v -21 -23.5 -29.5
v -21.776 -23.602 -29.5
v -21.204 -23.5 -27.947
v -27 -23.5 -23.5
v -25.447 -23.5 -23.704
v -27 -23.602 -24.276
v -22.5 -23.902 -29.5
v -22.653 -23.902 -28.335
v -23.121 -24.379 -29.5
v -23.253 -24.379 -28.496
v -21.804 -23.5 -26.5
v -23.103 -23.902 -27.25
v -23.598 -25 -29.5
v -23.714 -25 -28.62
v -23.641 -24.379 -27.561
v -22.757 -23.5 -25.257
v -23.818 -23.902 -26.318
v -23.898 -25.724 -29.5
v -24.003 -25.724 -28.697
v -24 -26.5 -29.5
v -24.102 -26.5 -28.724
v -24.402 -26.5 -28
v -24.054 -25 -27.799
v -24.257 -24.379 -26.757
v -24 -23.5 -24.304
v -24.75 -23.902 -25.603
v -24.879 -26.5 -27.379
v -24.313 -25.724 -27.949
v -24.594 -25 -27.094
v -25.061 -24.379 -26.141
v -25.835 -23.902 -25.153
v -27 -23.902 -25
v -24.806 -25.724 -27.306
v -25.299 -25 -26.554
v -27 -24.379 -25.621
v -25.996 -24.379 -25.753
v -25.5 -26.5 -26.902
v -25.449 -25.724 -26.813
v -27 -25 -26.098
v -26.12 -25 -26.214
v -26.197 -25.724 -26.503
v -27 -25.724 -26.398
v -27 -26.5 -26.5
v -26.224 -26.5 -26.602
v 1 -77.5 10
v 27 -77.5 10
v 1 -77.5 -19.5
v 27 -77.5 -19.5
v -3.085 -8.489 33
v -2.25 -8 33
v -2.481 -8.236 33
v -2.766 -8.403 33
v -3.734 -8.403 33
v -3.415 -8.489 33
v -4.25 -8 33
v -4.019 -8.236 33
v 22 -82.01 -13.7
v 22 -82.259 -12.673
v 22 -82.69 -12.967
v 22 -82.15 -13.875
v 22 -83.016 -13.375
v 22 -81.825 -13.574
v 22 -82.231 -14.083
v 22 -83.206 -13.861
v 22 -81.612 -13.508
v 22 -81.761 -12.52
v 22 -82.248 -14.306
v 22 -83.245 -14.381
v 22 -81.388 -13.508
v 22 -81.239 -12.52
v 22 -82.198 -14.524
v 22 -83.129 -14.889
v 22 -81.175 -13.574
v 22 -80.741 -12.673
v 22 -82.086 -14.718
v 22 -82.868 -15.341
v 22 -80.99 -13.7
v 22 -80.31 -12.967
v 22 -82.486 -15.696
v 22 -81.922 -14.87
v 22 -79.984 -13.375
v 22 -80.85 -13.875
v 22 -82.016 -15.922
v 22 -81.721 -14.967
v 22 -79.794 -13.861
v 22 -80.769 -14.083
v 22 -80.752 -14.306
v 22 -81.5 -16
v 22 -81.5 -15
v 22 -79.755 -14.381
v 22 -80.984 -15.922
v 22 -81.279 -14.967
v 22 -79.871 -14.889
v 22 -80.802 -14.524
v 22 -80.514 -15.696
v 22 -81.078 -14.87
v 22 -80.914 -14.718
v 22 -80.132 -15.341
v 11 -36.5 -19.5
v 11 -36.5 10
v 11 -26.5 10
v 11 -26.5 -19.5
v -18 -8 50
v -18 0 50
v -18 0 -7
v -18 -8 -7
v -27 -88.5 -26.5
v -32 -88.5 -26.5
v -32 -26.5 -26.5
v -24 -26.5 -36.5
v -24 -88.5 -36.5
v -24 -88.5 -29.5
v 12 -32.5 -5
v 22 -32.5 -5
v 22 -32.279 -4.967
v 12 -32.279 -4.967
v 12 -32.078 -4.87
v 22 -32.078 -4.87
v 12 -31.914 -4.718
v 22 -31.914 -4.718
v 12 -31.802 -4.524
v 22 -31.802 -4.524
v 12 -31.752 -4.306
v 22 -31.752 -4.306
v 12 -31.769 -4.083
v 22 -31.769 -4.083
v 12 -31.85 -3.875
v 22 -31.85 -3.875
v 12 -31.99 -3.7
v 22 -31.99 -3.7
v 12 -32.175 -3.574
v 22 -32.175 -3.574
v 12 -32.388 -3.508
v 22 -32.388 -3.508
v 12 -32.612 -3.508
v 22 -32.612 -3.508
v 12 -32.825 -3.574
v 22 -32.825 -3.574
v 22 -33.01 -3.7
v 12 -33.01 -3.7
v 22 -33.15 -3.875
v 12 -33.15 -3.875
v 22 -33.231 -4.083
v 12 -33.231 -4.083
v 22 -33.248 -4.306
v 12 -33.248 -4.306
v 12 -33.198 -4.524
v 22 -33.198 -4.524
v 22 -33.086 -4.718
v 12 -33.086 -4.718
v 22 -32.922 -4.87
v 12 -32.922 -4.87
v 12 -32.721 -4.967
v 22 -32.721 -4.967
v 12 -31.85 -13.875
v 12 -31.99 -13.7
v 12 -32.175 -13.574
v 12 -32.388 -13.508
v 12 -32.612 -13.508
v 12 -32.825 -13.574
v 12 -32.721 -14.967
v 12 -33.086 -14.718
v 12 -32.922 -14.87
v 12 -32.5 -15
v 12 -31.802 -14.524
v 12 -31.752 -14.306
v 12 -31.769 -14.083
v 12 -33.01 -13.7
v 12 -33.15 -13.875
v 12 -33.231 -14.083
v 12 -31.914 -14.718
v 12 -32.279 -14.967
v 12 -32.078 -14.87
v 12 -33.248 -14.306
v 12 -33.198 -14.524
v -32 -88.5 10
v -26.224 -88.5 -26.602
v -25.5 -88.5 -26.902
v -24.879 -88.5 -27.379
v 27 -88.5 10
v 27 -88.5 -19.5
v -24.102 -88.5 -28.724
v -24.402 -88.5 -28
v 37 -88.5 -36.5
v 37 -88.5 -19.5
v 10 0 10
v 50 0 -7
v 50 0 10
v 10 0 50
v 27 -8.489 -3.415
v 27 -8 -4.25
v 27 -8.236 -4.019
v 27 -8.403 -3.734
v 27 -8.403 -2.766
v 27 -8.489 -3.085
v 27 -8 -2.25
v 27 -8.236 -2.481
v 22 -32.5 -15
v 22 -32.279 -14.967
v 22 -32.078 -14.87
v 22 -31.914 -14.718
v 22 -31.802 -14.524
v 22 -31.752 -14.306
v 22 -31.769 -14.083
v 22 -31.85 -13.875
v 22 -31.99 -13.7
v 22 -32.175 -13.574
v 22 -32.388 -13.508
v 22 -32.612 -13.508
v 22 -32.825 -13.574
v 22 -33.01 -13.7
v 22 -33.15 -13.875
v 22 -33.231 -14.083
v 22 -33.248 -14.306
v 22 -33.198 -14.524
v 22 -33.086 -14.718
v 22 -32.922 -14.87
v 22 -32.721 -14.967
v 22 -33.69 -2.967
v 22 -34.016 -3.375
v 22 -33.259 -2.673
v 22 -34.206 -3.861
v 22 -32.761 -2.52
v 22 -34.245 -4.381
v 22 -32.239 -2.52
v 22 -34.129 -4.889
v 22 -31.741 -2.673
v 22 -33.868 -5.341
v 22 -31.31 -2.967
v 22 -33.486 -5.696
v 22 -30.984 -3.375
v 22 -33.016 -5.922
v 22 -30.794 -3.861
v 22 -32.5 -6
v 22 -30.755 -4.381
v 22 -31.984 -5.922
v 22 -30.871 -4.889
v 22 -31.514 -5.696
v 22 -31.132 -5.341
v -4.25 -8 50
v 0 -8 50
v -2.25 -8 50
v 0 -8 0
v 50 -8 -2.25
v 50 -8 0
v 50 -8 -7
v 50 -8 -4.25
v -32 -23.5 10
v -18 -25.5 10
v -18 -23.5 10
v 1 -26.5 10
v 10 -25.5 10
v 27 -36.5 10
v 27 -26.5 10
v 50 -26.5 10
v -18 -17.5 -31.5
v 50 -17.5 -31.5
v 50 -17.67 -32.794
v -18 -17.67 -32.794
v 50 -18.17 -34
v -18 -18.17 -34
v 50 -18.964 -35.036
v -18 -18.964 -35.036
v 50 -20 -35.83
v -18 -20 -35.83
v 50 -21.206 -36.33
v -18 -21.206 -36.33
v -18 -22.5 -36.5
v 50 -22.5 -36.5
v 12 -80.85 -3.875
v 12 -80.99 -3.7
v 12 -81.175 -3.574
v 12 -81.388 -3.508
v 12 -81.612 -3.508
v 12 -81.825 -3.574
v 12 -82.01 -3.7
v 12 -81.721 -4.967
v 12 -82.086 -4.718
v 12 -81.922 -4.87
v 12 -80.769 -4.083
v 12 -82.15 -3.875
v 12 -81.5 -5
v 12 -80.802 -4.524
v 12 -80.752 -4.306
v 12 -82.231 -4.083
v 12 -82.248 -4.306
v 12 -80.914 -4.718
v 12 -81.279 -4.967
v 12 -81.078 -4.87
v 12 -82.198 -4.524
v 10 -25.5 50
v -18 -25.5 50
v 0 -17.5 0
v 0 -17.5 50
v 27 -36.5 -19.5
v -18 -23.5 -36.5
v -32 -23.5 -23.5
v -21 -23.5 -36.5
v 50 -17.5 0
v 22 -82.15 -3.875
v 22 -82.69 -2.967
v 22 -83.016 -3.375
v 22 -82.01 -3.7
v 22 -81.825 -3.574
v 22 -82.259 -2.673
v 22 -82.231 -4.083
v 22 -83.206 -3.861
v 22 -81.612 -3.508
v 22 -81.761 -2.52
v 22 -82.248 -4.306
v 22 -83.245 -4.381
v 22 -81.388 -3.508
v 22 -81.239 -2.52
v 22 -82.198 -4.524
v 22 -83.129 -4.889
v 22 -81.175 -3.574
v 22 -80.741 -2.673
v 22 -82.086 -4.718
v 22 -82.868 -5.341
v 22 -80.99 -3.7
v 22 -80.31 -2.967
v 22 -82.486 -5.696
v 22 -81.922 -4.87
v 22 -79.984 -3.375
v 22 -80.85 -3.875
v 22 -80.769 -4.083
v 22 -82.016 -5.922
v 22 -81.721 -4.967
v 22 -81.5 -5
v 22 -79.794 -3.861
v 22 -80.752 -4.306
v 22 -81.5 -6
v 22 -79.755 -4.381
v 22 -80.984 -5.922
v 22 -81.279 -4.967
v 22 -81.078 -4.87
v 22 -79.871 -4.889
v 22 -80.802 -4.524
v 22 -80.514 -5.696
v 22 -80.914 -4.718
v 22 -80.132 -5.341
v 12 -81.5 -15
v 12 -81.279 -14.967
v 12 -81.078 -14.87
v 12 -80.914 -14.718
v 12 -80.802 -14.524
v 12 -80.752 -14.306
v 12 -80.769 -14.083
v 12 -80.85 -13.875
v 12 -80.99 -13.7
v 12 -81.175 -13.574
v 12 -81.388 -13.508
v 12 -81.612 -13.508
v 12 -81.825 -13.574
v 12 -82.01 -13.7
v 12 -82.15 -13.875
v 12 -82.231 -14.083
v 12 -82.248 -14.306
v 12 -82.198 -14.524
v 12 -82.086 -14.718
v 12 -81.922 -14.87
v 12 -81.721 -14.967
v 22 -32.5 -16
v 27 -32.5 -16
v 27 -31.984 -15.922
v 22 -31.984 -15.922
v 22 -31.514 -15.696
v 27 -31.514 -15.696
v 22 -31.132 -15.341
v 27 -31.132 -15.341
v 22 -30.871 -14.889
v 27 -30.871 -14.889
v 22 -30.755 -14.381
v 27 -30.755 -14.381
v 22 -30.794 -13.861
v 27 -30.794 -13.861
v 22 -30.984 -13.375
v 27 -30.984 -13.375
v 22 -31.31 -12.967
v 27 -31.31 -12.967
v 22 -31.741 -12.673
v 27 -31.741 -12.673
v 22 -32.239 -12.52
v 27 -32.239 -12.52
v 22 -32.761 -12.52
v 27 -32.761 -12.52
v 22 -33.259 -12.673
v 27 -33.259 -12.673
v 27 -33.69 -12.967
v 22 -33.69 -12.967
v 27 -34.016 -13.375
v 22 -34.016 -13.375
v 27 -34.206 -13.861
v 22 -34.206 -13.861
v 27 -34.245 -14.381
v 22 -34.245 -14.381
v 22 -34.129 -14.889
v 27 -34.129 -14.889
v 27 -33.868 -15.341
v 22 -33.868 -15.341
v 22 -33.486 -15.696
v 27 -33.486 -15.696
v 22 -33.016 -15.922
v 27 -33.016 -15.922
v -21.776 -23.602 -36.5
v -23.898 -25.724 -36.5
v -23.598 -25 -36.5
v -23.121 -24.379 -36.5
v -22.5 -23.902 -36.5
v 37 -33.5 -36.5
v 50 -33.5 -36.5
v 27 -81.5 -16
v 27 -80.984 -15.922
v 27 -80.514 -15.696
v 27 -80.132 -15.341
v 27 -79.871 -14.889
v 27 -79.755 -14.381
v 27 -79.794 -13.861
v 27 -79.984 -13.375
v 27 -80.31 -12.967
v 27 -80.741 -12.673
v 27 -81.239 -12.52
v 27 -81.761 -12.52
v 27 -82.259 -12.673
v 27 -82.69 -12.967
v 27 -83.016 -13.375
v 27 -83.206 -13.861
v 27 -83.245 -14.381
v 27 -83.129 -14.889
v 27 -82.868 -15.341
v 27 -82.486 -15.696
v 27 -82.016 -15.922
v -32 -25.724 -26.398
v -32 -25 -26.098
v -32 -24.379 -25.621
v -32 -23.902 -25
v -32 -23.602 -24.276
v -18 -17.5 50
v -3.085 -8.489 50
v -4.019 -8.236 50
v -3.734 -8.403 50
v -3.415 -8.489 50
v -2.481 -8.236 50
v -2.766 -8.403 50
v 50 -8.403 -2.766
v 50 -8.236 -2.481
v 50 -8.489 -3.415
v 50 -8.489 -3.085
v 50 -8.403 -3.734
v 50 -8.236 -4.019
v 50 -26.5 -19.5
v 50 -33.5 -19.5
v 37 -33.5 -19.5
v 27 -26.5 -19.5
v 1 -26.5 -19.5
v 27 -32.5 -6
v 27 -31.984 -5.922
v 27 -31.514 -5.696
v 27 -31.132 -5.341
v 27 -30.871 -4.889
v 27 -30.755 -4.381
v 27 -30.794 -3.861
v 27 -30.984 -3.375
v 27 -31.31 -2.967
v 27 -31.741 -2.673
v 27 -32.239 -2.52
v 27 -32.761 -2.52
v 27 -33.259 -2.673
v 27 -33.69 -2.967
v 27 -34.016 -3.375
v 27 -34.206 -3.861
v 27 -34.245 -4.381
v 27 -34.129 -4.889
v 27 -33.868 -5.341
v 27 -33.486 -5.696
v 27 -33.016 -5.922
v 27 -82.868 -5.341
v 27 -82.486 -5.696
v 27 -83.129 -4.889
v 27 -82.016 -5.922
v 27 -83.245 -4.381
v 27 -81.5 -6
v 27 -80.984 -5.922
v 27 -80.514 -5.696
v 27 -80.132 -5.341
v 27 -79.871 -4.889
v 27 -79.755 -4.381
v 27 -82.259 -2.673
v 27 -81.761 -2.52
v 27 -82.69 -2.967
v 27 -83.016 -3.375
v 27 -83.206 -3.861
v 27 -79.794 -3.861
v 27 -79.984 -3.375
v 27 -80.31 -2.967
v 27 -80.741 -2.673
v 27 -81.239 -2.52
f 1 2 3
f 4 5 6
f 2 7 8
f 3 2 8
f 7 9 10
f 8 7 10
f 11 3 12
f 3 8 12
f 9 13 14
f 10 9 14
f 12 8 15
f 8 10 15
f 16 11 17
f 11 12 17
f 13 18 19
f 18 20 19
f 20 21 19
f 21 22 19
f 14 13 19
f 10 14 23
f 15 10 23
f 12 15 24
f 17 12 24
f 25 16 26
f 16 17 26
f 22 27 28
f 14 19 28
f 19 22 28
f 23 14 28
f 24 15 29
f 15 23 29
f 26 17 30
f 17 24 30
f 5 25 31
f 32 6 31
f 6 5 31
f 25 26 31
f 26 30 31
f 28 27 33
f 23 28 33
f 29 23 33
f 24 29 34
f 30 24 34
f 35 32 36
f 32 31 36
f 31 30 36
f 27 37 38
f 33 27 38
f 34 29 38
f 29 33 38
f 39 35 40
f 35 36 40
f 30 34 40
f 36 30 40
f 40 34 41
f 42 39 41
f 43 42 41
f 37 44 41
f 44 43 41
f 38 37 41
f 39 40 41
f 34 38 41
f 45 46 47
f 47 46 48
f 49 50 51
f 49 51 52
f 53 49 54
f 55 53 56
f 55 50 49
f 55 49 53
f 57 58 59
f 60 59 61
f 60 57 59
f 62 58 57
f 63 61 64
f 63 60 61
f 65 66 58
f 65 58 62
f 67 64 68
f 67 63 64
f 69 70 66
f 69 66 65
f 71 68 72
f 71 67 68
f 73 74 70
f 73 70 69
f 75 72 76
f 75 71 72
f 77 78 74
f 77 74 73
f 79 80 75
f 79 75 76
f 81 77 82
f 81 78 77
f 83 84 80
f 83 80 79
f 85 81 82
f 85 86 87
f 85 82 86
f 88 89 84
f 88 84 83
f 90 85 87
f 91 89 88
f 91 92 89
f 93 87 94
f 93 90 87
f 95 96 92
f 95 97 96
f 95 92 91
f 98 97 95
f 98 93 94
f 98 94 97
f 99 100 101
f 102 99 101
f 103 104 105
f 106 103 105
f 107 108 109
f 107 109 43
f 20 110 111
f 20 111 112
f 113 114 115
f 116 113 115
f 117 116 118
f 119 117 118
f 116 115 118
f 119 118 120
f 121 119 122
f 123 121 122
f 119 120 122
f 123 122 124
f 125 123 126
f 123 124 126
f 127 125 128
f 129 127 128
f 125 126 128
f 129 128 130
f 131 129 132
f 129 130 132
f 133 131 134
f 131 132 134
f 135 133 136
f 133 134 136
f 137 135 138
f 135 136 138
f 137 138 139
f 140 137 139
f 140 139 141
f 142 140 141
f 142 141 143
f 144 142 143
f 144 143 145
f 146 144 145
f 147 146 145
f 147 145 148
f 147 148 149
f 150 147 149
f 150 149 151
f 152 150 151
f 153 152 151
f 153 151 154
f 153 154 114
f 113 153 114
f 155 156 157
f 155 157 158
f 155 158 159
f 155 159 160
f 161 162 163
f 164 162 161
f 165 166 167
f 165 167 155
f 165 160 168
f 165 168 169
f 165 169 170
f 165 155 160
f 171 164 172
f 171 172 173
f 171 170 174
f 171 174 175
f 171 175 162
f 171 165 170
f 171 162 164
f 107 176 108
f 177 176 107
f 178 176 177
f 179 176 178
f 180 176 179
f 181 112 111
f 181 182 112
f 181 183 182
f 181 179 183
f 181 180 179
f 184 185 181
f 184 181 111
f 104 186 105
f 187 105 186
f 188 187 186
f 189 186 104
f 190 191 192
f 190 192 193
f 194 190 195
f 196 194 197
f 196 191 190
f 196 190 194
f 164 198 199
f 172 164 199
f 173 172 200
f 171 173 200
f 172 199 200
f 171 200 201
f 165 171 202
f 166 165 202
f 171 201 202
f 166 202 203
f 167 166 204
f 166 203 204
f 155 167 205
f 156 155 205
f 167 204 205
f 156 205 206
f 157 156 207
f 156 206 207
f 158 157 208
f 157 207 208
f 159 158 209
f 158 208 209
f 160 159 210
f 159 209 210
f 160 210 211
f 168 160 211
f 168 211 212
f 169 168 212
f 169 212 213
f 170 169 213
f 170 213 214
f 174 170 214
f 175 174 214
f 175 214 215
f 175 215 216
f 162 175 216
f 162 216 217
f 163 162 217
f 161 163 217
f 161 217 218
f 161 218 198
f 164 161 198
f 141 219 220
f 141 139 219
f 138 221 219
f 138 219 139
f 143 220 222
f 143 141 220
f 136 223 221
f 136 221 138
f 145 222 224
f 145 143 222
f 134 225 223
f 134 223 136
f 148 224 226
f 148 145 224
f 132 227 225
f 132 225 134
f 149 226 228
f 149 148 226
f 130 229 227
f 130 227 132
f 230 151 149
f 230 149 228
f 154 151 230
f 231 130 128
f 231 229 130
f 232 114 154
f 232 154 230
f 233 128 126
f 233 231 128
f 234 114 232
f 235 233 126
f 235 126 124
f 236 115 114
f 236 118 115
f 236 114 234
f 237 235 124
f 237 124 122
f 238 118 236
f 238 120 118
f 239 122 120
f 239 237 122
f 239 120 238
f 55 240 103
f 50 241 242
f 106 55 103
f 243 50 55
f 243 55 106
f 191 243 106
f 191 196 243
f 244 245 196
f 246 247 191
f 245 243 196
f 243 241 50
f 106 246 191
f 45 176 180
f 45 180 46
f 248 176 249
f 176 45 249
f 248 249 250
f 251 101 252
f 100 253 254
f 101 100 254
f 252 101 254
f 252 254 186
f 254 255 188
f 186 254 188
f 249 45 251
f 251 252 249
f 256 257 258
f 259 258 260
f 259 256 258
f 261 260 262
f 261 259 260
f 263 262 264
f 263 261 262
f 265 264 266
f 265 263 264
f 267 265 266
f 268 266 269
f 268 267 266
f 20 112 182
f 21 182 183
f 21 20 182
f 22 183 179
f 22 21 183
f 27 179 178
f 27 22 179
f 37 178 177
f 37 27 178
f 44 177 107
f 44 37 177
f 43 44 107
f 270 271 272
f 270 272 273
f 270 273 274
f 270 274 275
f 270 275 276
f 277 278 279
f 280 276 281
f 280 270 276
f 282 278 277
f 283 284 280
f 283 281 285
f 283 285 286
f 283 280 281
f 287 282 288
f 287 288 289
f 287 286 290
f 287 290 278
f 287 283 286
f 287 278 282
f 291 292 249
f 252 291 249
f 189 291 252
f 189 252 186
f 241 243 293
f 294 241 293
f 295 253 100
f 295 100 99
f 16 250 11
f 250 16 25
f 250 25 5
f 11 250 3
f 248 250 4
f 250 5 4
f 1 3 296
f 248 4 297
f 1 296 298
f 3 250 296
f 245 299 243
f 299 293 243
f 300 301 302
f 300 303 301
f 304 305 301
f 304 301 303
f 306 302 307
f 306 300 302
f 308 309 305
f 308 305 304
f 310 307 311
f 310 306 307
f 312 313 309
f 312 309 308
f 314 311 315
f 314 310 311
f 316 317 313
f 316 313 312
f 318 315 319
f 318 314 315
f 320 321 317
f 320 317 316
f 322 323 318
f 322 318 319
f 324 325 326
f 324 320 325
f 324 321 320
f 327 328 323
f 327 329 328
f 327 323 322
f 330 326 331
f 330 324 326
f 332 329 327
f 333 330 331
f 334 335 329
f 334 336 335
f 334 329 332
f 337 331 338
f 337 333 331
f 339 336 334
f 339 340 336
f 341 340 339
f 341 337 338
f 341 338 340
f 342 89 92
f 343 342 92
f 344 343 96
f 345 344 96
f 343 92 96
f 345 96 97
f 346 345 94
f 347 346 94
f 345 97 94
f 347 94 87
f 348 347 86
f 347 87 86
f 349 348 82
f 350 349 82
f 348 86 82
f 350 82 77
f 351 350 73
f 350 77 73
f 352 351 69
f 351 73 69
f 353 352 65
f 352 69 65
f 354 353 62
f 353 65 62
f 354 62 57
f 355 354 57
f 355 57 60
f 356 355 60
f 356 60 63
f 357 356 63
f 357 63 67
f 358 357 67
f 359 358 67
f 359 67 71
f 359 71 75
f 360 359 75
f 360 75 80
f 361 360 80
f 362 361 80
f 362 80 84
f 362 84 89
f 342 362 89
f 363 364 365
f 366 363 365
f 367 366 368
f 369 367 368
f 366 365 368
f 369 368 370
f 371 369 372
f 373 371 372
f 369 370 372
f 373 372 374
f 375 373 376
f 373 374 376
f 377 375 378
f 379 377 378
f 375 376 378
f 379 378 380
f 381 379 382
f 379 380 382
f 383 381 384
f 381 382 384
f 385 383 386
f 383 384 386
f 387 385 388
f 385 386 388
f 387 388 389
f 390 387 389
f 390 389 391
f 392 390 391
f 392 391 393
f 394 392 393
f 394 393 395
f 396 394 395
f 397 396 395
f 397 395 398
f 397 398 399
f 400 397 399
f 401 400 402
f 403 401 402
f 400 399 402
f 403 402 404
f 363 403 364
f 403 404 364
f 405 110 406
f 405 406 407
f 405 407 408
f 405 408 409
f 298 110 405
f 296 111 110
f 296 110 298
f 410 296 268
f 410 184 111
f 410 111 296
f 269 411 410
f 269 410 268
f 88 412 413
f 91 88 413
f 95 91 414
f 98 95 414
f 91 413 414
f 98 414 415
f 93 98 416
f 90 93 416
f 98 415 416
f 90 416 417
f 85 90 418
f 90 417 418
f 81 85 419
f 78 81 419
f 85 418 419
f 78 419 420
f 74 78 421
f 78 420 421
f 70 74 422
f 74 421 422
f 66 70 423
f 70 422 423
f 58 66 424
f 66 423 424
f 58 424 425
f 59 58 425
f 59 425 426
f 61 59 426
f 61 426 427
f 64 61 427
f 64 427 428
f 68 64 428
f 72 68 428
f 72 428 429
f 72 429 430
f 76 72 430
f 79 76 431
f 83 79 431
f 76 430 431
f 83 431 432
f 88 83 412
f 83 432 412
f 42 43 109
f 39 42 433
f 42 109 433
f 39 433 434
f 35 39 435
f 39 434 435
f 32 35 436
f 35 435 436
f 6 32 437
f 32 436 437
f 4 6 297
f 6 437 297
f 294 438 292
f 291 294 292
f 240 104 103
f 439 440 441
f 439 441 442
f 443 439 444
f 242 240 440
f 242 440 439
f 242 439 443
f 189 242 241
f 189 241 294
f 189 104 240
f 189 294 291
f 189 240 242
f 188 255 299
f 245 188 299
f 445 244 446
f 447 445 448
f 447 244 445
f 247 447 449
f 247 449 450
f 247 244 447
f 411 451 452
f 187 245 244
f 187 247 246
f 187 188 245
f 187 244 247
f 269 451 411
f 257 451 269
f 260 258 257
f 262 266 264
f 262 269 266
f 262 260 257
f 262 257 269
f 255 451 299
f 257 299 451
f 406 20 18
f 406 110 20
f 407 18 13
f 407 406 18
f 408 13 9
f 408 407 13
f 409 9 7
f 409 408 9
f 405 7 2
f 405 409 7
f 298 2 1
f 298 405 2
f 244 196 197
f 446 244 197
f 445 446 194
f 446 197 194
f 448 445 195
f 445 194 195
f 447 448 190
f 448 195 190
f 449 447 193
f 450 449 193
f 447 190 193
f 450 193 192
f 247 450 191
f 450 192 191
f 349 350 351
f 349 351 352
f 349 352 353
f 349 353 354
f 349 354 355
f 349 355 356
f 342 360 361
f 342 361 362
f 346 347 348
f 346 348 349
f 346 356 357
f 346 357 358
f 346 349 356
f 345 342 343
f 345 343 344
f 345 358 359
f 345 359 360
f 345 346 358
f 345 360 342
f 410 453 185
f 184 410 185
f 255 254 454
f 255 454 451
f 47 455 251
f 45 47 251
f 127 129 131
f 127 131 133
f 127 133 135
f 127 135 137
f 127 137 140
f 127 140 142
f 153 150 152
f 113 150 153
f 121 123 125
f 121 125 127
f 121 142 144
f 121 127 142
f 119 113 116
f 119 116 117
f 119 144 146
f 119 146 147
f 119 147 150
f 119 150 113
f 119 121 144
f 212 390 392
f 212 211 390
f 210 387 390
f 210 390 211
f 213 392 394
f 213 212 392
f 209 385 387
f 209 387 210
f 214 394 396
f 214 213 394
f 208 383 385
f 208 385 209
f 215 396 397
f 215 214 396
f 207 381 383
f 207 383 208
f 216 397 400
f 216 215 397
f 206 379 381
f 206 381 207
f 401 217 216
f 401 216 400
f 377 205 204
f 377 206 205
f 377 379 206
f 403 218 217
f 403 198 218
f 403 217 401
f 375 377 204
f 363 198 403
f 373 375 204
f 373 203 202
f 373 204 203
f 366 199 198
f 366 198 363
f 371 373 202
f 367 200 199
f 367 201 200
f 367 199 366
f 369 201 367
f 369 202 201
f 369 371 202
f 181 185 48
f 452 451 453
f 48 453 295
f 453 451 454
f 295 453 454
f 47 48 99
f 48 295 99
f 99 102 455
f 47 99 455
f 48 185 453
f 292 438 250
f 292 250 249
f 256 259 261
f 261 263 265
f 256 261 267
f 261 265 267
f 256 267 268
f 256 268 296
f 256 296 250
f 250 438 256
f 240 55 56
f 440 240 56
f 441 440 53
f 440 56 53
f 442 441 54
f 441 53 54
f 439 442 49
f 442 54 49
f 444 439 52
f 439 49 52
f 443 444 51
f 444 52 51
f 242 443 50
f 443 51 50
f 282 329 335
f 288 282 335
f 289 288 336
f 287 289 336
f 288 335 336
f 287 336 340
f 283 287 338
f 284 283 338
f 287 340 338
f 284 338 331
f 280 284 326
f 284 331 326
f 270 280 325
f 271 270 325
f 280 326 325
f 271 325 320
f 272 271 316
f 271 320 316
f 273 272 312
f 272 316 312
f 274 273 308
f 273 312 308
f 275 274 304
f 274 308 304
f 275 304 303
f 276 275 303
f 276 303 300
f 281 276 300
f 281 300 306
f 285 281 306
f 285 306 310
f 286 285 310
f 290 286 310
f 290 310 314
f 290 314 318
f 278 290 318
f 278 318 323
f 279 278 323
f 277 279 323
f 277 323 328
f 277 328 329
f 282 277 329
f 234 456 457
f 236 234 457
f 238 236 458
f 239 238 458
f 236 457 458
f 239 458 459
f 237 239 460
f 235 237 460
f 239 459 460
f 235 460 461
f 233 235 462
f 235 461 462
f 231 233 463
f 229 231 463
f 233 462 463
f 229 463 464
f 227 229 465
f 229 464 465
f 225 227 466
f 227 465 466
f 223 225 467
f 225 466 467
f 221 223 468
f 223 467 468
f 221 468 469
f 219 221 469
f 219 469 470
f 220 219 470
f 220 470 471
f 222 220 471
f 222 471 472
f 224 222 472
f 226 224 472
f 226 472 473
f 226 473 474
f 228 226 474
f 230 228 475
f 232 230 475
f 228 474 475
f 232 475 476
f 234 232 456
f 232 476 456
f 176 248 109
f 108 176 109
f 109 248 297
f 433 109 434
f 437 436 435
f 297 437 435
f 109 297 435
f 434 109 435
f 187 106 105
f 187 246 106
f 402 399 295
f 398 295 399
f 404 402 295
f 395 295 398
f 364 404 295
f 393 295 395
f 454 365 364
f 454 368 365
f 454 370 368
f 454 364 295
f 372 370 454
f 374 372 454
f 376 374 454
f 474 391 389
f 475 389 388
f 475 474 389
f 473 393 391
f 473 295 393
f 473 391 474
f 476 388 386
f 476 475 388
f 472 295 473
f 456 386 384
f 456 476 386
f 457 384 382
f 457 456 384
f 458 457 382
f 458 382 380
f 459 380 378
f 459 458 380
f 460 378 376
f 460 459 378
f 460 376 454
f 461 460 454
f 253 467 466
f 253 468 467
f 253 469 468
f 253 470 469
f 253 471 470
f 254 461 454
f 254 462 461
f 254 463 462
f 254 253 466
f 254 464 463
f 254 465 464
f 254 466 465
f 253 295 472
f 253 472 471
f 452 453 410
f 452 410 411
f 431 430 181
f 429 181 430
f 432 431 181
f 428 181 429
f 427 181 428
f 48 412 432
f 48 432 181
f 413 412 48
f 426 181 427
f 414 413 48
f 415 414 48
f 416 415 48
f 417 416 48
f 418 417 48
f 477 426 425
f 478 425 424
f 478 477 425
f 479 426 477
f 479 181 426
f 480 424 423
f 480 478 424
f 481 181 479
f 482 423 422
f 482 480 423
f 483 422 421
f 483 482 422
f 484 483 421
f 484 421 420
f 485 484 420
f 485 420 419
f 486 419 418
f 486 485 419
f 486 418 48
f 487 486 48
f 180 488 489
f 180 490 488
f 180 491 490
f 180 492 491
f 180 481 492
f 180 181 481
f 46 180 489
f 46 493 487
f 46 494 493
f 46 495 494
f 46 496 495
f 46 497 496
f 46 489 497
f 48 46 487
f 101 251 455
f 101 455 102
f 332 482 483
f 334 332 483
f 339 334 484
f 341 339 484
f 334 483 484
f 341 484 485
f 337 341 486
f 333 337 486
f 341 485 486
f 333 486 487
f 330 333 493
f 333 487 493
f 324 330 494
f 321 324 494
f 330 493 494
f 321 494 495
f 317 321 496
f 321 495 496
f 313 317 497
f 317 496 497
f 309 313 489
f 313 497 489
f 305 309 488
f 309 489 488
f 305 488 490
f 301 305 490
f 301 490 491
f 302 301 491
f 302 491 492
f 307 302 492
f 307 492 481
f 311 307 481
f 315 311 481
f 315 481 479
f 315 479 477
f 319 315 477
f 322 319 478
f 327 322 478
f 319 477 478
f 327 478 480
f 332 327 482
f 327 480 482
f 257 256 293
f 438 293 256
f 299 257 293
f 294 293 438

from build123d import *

# Parameters (mm, degrees)
BOSS_EXTRUDE1_DEPTH = 50
SKETCH2_W           = 7
SKETCH2_H           = 8
BOSS_EXTRUDE2_DEPTH = 50
SKETCH2_3_W         = 7
SKETCH2_3_H         = 8
BOSS_EXTRUDE3_DEPTH = 18
SKETCH3_W           = 10
SKETCH3_H           = 63
SKETCH3_W_2         = 7
SKETCH3_H_2         = 8
BOSS_EXTRUDE4_DEPTH = 82
FILLET1_R           = 5
SKETCH4_W           = 49
SKETCH4_H           = 29.5
CUT_EXTRUDE1_DEPTH  = 63
SKETCH5_W           = 29.5
SKETCH5_H           = 11
BOSS_EXTRUDE5_DEPTH = 49
CUT_EXTRUDE2_DEPTH  = 29.5
SKETCH6_R           = 1.75
CUT_EXTRUDE3_DEPTH  = 5
SKETCH6_6_R         = 0.75
CUT_EXTRUDE4_DEPTH  = 15
SKETCH8_W           = 18
SKETCH8_H           = 9.5
CUT_EXTRUDE5_DEPTH  = 40
SKETCH9_W           = 7
SKETCH9_H           = 9.5
CUT_EXTRUDE6_DEPTH  = 45
SKETCH10_W          = 10
SKETCH10_H          = 10
CUT_EXTRUDE7_DEPTH  = 29.5
SKETCH11_W          = 13
SKETCH11_H          = 48
SKETCH11_H_2        = 7
CUT_EXTRUDE8_DEPTH  = 124.13610356
SKETCH12_W          = 8
SKETCH12_H          = 10
CUT_EXTRUDE9_DEPTH  = 114.279521539
SKETCH13_W          = 10
SKETCH13_H          = 6
CUT_EXTRUDE10_DEPTH = 14
SKETCH15_W          = 14
SKETCH15_H          = 6
CUT_EXTRUDE11_DEPTH = 128.218316291
FILLET2_R           = 3


with BuildPart() as part:
    # Sketch1 → Boss-Extrude1 (new body)
    with BuildSketch(Plane.XY):
        with BuildLine():
            Line((-2.25, -8), (-4.25, -8))
            ThreePointArc((-4.25, -8), (-3.25, -8.5), (-2.25, -8))
        make_face()
        Polygon((10, -25.5), (10, 0), (0, 0), (-18, 0), (-18, -8), (0, -8), (0, -17.5), (-18, -17.5), (-18, -25.5), align=None)
    extrude(amount=BOSS_EXTRUDE1_DEPTH)

    # Sketch2 → Boss-Extrude2 (add)
    with BuildSketch(Plane(origin=(0, 0, 0), x_dir=(0, 0, -1), z_dir=(1, 0, 0))):
        Polygon((7, 0), (0, 0), (0, -8), (2.25, -8), (4.25, -8), (7, -8), align=None)
        Polygon((0, -8), (0, 0), (-10, 0), (-10, -25.5), (0, -25.5), (0, -17.5), align=None)
        with Locations((3.5, -21.5)):
            Rectangle(SKETCH2_W, SKETCH2_H)
        with BuildLine():
            Line((4.25, -8), (2.25, -8))
            ThreePointArc((2.25, -8), (3.25, -8.5), (4.25, -8))
        make_face()
    extrude(amount=BOSS_EXTRUDE2_DEPTH)

    # Sketch2<3> → Boss-Extrude3 (add)
    with BuildSketch(Plane(origin=(0, 0, 0), x_dir=(0, 0, -1), z_dir=(1, 0, 0))):
        Polygon((7, 0), (0, 0), (0, -8), (2.25, -8), (4.25, -8), (7, -8), align=None)
        with Locations((3.5, -21.5)):
            Rectangle(SKETCH2_3_W, SKETCH2_3_H)
    extrude(amount=-BOSS_EXTRUDE3_DEPTH)

    # Sketch3 → Boss-Extrude4 (add)
    with BuildSketch(Plane(origin=(50, 0, 0), x_dir=(0, 0, -1), z_dir=(1, 0, 0))):
        Polygon((36.5, -17.5), (7, -17.5), (7, -25.5), (0, -25.5), (0, -88.5), (36.5, -88.5), align=None)
        with Locations((-5, -57)):
            Rectangle(SKETCH3_W, SKETCH3_H)
        with Locations((3.5, -21.5)):
            Rectangle(SKETCH3_W_2, SKETCH3_H_2)
        with Locations((-5, -21.5)):
            Rectangle(SKETCH3_W, SKETCH3_H_2)
    extrude(amount=-BOSS_EXTRUDE4_DEPTH)

    # Fillet1
    fillet1_edges = [part.edges().sort_by_distance(p)[0] for p in [
        (-32, -17.5, -13.25),
        (-32, -53, -36.5),
        (9, -17.5, -36.5),
    ]]
    fillet(fillet1_edges, radius=FILLET1_R)

    # Sketch4 → Cut-Extrude1 (cut)
    with BuildSketch(Plane.XZ.offset(88.5)):
        with Locations((25.5, -4.75)):
            Rectangle(SKETCH4_W, SKETCH4_H)
    extrude(amount=-CUT_EXTRUDE1_DEPTH, mode=Mode.SUBTRACT)

    # Sketch5 → Boss-Extrude5 (add)
    with BuildSketch(Plane(origin=(50, 0, 0), x_dir=(0, 0, -1), z_dir=(1, 0, 0))):
        with Locations((4.75, -31)):
            Rectangle(SKETCH5_W, SKETCH5_H)
        with Locations((4.75, -83)):
            Rectangle(SKETCH5_W, SKETCH5_H)
    extrude(amount=-BOSS_EXTRUDE5_DEPTH)

    # Sketch7 → Cut-Extrude2 (cut)
    with BuildSketch(Plane.XY.offset(10)):
        Polygon((1, -36.5), (27, -36.5), (27, -26.5), (50, -26.5), (50, -88.5), (27, -88.5), (27, -77.5), (1, -77.5), align=None)
    extrude(amount=-CUT_EXTRUDE2_DEPTH, mode=Mode.SUBTRACT)

    # Sketch6 → Cut-Extrude3 (cut)
    with BuildSketch(Plane(origin=(27, 0, 0), x_dir=(0, 0, -1), z_dir=(1, 0, 0))):
        with Locations((4.25, -81.5)):
            Circle(SKETCH6_R)
        with Locations((14.25, -81.5)):
            Circle(SKETCH6_R)
        with Locations((14.25, -32.5)):
            Circle(SKETCH6_R)
        with Locations((4.25, -32.5)):
            Circle(SKETCH6_R)
    extrude(amount=-CUT_EXTRUDE3_DEPTH, mode=Mode.SUBTRACT)

    # Sketch6<6> → Cut-Extrude4 (cut)
    with BuildSketch(Plane(origin=(27, 0, 0), x_dir=(0, 0, -1), z_dir=(1, 0, 0))):
        with Locations((4.25, -81.5)):
            Circle(SKETCH6_6_R)
        with Locations((14.25, -81.5)):
            Circle(SKETCH6_6_R)
        with Locations((14.25, -32.5)):
            Circle(SKETCH6_6_R)
        with Locations((4.25, -32.5)):
            Circle(SKETCH6_6_R)
    extrude(amount=-CUT_EXTRUDE4_DEPTH, mode=Mode.SUBTRACT)

    # Sketch8 → Cut-Extrude5 (cut)
    with BuildSketch(Plane(origin=(0, 0, -7), x_dir=(-1, 0, 0), z_dir=(0, 0, -1))):
        with Locations((9, -12.75)):
            Rectangle(SKETCH8_W, SKETCH8_H)
    extrude(amount=-CUT_EXTRUDE5_DEPTH, mode=Mode.SUBTRACT)

    # Sketch9 → Cut-Extrude6 (cut)
    with BuildSketch(Plane.ZY.offset(18)):
        with Locations((-3.5, -12.75)):
            Rectangle(SKETCH9_W, SKETCH9_H)
    extrude(amount=-CUT_EXTRUDE6_DEPTH, mode=Mode.SUBTRACT)

    # Sketch10 → Cut-Extrude7 (cut)
    with BuildSketch(Plane.XY.offset(10)):
        with Locations((6, -31.5)):
            Rectangle(SKETCH10_W, SKETCH10_H)
    extrude(amount=-CUT_EXTRUDE7_DEPTH, mode=Mode.SUBTRACT)

    # Sketch11 → Cut-Extrude8 (cut, through all)
    with BuildSketch(Plane.XY.offset(-19.5)):
        with Locations((43.5, -57.5)):
            Rectangle(SKETCH11_W, SKETCH11_H)
        with Locations((43.5, -85)):
            Rectangle(SKETCH11_W, SKETCH11_H_2)
    extrude(amount=-CUT_EXTRUDE8_DEPTH, mode=Mode.SUBTRACT)

    # Sketch12 → Cut-Extrude9 (cut, through all)
    with BuildSketch(Plane.XZ.offset(88.5)):
        with Locations((-28, -31.5)):
            Rectangle(SKETCH12_W, SKETCH12_H)
    extrude(amount=-CUT_EXTRUDE9_DEPTH, mode=Mode.SUBTRACT)

    # Sketch13 → Cut-Extrude10 (cut)
    with BuildSketch(Plane.ZY.offset(32)):
        with Locations((-31.5, -20.5)):
            Rectangle(SKETCH13_W, SKETCH13_H)
    extrude(amount=-CUT_EXTRUDE10_DEPTH, mode=Mode.SUBTRACT)

    # Sketch15 → Cut-Extrude11 (cut, through all)
    with BuildSketch(Plane(origin=(0, 0, -26.5), x_dir=(-1, 0, 0), z_dir=(0, 0, -1))):
        with Locations((25, -20.5)):
            Rectangle(SKETCH15_W, SKETCH15_H)
    extrude(amount=-CUT_EXTRUDE11_DEPTH, mode=Mode.SUBTRACT)

    # Fillet2
    fillet2_edges = [part.edges().sort_by_distance(p)[0] for p in [
        (-24, -56, -26.5),
        (-24, -23.5, -31.5),
        (-28, -23.5, -26.5),
    ]]
    fillet(fillet2_edges, radius=FILLET2_R)


solid = part.part
